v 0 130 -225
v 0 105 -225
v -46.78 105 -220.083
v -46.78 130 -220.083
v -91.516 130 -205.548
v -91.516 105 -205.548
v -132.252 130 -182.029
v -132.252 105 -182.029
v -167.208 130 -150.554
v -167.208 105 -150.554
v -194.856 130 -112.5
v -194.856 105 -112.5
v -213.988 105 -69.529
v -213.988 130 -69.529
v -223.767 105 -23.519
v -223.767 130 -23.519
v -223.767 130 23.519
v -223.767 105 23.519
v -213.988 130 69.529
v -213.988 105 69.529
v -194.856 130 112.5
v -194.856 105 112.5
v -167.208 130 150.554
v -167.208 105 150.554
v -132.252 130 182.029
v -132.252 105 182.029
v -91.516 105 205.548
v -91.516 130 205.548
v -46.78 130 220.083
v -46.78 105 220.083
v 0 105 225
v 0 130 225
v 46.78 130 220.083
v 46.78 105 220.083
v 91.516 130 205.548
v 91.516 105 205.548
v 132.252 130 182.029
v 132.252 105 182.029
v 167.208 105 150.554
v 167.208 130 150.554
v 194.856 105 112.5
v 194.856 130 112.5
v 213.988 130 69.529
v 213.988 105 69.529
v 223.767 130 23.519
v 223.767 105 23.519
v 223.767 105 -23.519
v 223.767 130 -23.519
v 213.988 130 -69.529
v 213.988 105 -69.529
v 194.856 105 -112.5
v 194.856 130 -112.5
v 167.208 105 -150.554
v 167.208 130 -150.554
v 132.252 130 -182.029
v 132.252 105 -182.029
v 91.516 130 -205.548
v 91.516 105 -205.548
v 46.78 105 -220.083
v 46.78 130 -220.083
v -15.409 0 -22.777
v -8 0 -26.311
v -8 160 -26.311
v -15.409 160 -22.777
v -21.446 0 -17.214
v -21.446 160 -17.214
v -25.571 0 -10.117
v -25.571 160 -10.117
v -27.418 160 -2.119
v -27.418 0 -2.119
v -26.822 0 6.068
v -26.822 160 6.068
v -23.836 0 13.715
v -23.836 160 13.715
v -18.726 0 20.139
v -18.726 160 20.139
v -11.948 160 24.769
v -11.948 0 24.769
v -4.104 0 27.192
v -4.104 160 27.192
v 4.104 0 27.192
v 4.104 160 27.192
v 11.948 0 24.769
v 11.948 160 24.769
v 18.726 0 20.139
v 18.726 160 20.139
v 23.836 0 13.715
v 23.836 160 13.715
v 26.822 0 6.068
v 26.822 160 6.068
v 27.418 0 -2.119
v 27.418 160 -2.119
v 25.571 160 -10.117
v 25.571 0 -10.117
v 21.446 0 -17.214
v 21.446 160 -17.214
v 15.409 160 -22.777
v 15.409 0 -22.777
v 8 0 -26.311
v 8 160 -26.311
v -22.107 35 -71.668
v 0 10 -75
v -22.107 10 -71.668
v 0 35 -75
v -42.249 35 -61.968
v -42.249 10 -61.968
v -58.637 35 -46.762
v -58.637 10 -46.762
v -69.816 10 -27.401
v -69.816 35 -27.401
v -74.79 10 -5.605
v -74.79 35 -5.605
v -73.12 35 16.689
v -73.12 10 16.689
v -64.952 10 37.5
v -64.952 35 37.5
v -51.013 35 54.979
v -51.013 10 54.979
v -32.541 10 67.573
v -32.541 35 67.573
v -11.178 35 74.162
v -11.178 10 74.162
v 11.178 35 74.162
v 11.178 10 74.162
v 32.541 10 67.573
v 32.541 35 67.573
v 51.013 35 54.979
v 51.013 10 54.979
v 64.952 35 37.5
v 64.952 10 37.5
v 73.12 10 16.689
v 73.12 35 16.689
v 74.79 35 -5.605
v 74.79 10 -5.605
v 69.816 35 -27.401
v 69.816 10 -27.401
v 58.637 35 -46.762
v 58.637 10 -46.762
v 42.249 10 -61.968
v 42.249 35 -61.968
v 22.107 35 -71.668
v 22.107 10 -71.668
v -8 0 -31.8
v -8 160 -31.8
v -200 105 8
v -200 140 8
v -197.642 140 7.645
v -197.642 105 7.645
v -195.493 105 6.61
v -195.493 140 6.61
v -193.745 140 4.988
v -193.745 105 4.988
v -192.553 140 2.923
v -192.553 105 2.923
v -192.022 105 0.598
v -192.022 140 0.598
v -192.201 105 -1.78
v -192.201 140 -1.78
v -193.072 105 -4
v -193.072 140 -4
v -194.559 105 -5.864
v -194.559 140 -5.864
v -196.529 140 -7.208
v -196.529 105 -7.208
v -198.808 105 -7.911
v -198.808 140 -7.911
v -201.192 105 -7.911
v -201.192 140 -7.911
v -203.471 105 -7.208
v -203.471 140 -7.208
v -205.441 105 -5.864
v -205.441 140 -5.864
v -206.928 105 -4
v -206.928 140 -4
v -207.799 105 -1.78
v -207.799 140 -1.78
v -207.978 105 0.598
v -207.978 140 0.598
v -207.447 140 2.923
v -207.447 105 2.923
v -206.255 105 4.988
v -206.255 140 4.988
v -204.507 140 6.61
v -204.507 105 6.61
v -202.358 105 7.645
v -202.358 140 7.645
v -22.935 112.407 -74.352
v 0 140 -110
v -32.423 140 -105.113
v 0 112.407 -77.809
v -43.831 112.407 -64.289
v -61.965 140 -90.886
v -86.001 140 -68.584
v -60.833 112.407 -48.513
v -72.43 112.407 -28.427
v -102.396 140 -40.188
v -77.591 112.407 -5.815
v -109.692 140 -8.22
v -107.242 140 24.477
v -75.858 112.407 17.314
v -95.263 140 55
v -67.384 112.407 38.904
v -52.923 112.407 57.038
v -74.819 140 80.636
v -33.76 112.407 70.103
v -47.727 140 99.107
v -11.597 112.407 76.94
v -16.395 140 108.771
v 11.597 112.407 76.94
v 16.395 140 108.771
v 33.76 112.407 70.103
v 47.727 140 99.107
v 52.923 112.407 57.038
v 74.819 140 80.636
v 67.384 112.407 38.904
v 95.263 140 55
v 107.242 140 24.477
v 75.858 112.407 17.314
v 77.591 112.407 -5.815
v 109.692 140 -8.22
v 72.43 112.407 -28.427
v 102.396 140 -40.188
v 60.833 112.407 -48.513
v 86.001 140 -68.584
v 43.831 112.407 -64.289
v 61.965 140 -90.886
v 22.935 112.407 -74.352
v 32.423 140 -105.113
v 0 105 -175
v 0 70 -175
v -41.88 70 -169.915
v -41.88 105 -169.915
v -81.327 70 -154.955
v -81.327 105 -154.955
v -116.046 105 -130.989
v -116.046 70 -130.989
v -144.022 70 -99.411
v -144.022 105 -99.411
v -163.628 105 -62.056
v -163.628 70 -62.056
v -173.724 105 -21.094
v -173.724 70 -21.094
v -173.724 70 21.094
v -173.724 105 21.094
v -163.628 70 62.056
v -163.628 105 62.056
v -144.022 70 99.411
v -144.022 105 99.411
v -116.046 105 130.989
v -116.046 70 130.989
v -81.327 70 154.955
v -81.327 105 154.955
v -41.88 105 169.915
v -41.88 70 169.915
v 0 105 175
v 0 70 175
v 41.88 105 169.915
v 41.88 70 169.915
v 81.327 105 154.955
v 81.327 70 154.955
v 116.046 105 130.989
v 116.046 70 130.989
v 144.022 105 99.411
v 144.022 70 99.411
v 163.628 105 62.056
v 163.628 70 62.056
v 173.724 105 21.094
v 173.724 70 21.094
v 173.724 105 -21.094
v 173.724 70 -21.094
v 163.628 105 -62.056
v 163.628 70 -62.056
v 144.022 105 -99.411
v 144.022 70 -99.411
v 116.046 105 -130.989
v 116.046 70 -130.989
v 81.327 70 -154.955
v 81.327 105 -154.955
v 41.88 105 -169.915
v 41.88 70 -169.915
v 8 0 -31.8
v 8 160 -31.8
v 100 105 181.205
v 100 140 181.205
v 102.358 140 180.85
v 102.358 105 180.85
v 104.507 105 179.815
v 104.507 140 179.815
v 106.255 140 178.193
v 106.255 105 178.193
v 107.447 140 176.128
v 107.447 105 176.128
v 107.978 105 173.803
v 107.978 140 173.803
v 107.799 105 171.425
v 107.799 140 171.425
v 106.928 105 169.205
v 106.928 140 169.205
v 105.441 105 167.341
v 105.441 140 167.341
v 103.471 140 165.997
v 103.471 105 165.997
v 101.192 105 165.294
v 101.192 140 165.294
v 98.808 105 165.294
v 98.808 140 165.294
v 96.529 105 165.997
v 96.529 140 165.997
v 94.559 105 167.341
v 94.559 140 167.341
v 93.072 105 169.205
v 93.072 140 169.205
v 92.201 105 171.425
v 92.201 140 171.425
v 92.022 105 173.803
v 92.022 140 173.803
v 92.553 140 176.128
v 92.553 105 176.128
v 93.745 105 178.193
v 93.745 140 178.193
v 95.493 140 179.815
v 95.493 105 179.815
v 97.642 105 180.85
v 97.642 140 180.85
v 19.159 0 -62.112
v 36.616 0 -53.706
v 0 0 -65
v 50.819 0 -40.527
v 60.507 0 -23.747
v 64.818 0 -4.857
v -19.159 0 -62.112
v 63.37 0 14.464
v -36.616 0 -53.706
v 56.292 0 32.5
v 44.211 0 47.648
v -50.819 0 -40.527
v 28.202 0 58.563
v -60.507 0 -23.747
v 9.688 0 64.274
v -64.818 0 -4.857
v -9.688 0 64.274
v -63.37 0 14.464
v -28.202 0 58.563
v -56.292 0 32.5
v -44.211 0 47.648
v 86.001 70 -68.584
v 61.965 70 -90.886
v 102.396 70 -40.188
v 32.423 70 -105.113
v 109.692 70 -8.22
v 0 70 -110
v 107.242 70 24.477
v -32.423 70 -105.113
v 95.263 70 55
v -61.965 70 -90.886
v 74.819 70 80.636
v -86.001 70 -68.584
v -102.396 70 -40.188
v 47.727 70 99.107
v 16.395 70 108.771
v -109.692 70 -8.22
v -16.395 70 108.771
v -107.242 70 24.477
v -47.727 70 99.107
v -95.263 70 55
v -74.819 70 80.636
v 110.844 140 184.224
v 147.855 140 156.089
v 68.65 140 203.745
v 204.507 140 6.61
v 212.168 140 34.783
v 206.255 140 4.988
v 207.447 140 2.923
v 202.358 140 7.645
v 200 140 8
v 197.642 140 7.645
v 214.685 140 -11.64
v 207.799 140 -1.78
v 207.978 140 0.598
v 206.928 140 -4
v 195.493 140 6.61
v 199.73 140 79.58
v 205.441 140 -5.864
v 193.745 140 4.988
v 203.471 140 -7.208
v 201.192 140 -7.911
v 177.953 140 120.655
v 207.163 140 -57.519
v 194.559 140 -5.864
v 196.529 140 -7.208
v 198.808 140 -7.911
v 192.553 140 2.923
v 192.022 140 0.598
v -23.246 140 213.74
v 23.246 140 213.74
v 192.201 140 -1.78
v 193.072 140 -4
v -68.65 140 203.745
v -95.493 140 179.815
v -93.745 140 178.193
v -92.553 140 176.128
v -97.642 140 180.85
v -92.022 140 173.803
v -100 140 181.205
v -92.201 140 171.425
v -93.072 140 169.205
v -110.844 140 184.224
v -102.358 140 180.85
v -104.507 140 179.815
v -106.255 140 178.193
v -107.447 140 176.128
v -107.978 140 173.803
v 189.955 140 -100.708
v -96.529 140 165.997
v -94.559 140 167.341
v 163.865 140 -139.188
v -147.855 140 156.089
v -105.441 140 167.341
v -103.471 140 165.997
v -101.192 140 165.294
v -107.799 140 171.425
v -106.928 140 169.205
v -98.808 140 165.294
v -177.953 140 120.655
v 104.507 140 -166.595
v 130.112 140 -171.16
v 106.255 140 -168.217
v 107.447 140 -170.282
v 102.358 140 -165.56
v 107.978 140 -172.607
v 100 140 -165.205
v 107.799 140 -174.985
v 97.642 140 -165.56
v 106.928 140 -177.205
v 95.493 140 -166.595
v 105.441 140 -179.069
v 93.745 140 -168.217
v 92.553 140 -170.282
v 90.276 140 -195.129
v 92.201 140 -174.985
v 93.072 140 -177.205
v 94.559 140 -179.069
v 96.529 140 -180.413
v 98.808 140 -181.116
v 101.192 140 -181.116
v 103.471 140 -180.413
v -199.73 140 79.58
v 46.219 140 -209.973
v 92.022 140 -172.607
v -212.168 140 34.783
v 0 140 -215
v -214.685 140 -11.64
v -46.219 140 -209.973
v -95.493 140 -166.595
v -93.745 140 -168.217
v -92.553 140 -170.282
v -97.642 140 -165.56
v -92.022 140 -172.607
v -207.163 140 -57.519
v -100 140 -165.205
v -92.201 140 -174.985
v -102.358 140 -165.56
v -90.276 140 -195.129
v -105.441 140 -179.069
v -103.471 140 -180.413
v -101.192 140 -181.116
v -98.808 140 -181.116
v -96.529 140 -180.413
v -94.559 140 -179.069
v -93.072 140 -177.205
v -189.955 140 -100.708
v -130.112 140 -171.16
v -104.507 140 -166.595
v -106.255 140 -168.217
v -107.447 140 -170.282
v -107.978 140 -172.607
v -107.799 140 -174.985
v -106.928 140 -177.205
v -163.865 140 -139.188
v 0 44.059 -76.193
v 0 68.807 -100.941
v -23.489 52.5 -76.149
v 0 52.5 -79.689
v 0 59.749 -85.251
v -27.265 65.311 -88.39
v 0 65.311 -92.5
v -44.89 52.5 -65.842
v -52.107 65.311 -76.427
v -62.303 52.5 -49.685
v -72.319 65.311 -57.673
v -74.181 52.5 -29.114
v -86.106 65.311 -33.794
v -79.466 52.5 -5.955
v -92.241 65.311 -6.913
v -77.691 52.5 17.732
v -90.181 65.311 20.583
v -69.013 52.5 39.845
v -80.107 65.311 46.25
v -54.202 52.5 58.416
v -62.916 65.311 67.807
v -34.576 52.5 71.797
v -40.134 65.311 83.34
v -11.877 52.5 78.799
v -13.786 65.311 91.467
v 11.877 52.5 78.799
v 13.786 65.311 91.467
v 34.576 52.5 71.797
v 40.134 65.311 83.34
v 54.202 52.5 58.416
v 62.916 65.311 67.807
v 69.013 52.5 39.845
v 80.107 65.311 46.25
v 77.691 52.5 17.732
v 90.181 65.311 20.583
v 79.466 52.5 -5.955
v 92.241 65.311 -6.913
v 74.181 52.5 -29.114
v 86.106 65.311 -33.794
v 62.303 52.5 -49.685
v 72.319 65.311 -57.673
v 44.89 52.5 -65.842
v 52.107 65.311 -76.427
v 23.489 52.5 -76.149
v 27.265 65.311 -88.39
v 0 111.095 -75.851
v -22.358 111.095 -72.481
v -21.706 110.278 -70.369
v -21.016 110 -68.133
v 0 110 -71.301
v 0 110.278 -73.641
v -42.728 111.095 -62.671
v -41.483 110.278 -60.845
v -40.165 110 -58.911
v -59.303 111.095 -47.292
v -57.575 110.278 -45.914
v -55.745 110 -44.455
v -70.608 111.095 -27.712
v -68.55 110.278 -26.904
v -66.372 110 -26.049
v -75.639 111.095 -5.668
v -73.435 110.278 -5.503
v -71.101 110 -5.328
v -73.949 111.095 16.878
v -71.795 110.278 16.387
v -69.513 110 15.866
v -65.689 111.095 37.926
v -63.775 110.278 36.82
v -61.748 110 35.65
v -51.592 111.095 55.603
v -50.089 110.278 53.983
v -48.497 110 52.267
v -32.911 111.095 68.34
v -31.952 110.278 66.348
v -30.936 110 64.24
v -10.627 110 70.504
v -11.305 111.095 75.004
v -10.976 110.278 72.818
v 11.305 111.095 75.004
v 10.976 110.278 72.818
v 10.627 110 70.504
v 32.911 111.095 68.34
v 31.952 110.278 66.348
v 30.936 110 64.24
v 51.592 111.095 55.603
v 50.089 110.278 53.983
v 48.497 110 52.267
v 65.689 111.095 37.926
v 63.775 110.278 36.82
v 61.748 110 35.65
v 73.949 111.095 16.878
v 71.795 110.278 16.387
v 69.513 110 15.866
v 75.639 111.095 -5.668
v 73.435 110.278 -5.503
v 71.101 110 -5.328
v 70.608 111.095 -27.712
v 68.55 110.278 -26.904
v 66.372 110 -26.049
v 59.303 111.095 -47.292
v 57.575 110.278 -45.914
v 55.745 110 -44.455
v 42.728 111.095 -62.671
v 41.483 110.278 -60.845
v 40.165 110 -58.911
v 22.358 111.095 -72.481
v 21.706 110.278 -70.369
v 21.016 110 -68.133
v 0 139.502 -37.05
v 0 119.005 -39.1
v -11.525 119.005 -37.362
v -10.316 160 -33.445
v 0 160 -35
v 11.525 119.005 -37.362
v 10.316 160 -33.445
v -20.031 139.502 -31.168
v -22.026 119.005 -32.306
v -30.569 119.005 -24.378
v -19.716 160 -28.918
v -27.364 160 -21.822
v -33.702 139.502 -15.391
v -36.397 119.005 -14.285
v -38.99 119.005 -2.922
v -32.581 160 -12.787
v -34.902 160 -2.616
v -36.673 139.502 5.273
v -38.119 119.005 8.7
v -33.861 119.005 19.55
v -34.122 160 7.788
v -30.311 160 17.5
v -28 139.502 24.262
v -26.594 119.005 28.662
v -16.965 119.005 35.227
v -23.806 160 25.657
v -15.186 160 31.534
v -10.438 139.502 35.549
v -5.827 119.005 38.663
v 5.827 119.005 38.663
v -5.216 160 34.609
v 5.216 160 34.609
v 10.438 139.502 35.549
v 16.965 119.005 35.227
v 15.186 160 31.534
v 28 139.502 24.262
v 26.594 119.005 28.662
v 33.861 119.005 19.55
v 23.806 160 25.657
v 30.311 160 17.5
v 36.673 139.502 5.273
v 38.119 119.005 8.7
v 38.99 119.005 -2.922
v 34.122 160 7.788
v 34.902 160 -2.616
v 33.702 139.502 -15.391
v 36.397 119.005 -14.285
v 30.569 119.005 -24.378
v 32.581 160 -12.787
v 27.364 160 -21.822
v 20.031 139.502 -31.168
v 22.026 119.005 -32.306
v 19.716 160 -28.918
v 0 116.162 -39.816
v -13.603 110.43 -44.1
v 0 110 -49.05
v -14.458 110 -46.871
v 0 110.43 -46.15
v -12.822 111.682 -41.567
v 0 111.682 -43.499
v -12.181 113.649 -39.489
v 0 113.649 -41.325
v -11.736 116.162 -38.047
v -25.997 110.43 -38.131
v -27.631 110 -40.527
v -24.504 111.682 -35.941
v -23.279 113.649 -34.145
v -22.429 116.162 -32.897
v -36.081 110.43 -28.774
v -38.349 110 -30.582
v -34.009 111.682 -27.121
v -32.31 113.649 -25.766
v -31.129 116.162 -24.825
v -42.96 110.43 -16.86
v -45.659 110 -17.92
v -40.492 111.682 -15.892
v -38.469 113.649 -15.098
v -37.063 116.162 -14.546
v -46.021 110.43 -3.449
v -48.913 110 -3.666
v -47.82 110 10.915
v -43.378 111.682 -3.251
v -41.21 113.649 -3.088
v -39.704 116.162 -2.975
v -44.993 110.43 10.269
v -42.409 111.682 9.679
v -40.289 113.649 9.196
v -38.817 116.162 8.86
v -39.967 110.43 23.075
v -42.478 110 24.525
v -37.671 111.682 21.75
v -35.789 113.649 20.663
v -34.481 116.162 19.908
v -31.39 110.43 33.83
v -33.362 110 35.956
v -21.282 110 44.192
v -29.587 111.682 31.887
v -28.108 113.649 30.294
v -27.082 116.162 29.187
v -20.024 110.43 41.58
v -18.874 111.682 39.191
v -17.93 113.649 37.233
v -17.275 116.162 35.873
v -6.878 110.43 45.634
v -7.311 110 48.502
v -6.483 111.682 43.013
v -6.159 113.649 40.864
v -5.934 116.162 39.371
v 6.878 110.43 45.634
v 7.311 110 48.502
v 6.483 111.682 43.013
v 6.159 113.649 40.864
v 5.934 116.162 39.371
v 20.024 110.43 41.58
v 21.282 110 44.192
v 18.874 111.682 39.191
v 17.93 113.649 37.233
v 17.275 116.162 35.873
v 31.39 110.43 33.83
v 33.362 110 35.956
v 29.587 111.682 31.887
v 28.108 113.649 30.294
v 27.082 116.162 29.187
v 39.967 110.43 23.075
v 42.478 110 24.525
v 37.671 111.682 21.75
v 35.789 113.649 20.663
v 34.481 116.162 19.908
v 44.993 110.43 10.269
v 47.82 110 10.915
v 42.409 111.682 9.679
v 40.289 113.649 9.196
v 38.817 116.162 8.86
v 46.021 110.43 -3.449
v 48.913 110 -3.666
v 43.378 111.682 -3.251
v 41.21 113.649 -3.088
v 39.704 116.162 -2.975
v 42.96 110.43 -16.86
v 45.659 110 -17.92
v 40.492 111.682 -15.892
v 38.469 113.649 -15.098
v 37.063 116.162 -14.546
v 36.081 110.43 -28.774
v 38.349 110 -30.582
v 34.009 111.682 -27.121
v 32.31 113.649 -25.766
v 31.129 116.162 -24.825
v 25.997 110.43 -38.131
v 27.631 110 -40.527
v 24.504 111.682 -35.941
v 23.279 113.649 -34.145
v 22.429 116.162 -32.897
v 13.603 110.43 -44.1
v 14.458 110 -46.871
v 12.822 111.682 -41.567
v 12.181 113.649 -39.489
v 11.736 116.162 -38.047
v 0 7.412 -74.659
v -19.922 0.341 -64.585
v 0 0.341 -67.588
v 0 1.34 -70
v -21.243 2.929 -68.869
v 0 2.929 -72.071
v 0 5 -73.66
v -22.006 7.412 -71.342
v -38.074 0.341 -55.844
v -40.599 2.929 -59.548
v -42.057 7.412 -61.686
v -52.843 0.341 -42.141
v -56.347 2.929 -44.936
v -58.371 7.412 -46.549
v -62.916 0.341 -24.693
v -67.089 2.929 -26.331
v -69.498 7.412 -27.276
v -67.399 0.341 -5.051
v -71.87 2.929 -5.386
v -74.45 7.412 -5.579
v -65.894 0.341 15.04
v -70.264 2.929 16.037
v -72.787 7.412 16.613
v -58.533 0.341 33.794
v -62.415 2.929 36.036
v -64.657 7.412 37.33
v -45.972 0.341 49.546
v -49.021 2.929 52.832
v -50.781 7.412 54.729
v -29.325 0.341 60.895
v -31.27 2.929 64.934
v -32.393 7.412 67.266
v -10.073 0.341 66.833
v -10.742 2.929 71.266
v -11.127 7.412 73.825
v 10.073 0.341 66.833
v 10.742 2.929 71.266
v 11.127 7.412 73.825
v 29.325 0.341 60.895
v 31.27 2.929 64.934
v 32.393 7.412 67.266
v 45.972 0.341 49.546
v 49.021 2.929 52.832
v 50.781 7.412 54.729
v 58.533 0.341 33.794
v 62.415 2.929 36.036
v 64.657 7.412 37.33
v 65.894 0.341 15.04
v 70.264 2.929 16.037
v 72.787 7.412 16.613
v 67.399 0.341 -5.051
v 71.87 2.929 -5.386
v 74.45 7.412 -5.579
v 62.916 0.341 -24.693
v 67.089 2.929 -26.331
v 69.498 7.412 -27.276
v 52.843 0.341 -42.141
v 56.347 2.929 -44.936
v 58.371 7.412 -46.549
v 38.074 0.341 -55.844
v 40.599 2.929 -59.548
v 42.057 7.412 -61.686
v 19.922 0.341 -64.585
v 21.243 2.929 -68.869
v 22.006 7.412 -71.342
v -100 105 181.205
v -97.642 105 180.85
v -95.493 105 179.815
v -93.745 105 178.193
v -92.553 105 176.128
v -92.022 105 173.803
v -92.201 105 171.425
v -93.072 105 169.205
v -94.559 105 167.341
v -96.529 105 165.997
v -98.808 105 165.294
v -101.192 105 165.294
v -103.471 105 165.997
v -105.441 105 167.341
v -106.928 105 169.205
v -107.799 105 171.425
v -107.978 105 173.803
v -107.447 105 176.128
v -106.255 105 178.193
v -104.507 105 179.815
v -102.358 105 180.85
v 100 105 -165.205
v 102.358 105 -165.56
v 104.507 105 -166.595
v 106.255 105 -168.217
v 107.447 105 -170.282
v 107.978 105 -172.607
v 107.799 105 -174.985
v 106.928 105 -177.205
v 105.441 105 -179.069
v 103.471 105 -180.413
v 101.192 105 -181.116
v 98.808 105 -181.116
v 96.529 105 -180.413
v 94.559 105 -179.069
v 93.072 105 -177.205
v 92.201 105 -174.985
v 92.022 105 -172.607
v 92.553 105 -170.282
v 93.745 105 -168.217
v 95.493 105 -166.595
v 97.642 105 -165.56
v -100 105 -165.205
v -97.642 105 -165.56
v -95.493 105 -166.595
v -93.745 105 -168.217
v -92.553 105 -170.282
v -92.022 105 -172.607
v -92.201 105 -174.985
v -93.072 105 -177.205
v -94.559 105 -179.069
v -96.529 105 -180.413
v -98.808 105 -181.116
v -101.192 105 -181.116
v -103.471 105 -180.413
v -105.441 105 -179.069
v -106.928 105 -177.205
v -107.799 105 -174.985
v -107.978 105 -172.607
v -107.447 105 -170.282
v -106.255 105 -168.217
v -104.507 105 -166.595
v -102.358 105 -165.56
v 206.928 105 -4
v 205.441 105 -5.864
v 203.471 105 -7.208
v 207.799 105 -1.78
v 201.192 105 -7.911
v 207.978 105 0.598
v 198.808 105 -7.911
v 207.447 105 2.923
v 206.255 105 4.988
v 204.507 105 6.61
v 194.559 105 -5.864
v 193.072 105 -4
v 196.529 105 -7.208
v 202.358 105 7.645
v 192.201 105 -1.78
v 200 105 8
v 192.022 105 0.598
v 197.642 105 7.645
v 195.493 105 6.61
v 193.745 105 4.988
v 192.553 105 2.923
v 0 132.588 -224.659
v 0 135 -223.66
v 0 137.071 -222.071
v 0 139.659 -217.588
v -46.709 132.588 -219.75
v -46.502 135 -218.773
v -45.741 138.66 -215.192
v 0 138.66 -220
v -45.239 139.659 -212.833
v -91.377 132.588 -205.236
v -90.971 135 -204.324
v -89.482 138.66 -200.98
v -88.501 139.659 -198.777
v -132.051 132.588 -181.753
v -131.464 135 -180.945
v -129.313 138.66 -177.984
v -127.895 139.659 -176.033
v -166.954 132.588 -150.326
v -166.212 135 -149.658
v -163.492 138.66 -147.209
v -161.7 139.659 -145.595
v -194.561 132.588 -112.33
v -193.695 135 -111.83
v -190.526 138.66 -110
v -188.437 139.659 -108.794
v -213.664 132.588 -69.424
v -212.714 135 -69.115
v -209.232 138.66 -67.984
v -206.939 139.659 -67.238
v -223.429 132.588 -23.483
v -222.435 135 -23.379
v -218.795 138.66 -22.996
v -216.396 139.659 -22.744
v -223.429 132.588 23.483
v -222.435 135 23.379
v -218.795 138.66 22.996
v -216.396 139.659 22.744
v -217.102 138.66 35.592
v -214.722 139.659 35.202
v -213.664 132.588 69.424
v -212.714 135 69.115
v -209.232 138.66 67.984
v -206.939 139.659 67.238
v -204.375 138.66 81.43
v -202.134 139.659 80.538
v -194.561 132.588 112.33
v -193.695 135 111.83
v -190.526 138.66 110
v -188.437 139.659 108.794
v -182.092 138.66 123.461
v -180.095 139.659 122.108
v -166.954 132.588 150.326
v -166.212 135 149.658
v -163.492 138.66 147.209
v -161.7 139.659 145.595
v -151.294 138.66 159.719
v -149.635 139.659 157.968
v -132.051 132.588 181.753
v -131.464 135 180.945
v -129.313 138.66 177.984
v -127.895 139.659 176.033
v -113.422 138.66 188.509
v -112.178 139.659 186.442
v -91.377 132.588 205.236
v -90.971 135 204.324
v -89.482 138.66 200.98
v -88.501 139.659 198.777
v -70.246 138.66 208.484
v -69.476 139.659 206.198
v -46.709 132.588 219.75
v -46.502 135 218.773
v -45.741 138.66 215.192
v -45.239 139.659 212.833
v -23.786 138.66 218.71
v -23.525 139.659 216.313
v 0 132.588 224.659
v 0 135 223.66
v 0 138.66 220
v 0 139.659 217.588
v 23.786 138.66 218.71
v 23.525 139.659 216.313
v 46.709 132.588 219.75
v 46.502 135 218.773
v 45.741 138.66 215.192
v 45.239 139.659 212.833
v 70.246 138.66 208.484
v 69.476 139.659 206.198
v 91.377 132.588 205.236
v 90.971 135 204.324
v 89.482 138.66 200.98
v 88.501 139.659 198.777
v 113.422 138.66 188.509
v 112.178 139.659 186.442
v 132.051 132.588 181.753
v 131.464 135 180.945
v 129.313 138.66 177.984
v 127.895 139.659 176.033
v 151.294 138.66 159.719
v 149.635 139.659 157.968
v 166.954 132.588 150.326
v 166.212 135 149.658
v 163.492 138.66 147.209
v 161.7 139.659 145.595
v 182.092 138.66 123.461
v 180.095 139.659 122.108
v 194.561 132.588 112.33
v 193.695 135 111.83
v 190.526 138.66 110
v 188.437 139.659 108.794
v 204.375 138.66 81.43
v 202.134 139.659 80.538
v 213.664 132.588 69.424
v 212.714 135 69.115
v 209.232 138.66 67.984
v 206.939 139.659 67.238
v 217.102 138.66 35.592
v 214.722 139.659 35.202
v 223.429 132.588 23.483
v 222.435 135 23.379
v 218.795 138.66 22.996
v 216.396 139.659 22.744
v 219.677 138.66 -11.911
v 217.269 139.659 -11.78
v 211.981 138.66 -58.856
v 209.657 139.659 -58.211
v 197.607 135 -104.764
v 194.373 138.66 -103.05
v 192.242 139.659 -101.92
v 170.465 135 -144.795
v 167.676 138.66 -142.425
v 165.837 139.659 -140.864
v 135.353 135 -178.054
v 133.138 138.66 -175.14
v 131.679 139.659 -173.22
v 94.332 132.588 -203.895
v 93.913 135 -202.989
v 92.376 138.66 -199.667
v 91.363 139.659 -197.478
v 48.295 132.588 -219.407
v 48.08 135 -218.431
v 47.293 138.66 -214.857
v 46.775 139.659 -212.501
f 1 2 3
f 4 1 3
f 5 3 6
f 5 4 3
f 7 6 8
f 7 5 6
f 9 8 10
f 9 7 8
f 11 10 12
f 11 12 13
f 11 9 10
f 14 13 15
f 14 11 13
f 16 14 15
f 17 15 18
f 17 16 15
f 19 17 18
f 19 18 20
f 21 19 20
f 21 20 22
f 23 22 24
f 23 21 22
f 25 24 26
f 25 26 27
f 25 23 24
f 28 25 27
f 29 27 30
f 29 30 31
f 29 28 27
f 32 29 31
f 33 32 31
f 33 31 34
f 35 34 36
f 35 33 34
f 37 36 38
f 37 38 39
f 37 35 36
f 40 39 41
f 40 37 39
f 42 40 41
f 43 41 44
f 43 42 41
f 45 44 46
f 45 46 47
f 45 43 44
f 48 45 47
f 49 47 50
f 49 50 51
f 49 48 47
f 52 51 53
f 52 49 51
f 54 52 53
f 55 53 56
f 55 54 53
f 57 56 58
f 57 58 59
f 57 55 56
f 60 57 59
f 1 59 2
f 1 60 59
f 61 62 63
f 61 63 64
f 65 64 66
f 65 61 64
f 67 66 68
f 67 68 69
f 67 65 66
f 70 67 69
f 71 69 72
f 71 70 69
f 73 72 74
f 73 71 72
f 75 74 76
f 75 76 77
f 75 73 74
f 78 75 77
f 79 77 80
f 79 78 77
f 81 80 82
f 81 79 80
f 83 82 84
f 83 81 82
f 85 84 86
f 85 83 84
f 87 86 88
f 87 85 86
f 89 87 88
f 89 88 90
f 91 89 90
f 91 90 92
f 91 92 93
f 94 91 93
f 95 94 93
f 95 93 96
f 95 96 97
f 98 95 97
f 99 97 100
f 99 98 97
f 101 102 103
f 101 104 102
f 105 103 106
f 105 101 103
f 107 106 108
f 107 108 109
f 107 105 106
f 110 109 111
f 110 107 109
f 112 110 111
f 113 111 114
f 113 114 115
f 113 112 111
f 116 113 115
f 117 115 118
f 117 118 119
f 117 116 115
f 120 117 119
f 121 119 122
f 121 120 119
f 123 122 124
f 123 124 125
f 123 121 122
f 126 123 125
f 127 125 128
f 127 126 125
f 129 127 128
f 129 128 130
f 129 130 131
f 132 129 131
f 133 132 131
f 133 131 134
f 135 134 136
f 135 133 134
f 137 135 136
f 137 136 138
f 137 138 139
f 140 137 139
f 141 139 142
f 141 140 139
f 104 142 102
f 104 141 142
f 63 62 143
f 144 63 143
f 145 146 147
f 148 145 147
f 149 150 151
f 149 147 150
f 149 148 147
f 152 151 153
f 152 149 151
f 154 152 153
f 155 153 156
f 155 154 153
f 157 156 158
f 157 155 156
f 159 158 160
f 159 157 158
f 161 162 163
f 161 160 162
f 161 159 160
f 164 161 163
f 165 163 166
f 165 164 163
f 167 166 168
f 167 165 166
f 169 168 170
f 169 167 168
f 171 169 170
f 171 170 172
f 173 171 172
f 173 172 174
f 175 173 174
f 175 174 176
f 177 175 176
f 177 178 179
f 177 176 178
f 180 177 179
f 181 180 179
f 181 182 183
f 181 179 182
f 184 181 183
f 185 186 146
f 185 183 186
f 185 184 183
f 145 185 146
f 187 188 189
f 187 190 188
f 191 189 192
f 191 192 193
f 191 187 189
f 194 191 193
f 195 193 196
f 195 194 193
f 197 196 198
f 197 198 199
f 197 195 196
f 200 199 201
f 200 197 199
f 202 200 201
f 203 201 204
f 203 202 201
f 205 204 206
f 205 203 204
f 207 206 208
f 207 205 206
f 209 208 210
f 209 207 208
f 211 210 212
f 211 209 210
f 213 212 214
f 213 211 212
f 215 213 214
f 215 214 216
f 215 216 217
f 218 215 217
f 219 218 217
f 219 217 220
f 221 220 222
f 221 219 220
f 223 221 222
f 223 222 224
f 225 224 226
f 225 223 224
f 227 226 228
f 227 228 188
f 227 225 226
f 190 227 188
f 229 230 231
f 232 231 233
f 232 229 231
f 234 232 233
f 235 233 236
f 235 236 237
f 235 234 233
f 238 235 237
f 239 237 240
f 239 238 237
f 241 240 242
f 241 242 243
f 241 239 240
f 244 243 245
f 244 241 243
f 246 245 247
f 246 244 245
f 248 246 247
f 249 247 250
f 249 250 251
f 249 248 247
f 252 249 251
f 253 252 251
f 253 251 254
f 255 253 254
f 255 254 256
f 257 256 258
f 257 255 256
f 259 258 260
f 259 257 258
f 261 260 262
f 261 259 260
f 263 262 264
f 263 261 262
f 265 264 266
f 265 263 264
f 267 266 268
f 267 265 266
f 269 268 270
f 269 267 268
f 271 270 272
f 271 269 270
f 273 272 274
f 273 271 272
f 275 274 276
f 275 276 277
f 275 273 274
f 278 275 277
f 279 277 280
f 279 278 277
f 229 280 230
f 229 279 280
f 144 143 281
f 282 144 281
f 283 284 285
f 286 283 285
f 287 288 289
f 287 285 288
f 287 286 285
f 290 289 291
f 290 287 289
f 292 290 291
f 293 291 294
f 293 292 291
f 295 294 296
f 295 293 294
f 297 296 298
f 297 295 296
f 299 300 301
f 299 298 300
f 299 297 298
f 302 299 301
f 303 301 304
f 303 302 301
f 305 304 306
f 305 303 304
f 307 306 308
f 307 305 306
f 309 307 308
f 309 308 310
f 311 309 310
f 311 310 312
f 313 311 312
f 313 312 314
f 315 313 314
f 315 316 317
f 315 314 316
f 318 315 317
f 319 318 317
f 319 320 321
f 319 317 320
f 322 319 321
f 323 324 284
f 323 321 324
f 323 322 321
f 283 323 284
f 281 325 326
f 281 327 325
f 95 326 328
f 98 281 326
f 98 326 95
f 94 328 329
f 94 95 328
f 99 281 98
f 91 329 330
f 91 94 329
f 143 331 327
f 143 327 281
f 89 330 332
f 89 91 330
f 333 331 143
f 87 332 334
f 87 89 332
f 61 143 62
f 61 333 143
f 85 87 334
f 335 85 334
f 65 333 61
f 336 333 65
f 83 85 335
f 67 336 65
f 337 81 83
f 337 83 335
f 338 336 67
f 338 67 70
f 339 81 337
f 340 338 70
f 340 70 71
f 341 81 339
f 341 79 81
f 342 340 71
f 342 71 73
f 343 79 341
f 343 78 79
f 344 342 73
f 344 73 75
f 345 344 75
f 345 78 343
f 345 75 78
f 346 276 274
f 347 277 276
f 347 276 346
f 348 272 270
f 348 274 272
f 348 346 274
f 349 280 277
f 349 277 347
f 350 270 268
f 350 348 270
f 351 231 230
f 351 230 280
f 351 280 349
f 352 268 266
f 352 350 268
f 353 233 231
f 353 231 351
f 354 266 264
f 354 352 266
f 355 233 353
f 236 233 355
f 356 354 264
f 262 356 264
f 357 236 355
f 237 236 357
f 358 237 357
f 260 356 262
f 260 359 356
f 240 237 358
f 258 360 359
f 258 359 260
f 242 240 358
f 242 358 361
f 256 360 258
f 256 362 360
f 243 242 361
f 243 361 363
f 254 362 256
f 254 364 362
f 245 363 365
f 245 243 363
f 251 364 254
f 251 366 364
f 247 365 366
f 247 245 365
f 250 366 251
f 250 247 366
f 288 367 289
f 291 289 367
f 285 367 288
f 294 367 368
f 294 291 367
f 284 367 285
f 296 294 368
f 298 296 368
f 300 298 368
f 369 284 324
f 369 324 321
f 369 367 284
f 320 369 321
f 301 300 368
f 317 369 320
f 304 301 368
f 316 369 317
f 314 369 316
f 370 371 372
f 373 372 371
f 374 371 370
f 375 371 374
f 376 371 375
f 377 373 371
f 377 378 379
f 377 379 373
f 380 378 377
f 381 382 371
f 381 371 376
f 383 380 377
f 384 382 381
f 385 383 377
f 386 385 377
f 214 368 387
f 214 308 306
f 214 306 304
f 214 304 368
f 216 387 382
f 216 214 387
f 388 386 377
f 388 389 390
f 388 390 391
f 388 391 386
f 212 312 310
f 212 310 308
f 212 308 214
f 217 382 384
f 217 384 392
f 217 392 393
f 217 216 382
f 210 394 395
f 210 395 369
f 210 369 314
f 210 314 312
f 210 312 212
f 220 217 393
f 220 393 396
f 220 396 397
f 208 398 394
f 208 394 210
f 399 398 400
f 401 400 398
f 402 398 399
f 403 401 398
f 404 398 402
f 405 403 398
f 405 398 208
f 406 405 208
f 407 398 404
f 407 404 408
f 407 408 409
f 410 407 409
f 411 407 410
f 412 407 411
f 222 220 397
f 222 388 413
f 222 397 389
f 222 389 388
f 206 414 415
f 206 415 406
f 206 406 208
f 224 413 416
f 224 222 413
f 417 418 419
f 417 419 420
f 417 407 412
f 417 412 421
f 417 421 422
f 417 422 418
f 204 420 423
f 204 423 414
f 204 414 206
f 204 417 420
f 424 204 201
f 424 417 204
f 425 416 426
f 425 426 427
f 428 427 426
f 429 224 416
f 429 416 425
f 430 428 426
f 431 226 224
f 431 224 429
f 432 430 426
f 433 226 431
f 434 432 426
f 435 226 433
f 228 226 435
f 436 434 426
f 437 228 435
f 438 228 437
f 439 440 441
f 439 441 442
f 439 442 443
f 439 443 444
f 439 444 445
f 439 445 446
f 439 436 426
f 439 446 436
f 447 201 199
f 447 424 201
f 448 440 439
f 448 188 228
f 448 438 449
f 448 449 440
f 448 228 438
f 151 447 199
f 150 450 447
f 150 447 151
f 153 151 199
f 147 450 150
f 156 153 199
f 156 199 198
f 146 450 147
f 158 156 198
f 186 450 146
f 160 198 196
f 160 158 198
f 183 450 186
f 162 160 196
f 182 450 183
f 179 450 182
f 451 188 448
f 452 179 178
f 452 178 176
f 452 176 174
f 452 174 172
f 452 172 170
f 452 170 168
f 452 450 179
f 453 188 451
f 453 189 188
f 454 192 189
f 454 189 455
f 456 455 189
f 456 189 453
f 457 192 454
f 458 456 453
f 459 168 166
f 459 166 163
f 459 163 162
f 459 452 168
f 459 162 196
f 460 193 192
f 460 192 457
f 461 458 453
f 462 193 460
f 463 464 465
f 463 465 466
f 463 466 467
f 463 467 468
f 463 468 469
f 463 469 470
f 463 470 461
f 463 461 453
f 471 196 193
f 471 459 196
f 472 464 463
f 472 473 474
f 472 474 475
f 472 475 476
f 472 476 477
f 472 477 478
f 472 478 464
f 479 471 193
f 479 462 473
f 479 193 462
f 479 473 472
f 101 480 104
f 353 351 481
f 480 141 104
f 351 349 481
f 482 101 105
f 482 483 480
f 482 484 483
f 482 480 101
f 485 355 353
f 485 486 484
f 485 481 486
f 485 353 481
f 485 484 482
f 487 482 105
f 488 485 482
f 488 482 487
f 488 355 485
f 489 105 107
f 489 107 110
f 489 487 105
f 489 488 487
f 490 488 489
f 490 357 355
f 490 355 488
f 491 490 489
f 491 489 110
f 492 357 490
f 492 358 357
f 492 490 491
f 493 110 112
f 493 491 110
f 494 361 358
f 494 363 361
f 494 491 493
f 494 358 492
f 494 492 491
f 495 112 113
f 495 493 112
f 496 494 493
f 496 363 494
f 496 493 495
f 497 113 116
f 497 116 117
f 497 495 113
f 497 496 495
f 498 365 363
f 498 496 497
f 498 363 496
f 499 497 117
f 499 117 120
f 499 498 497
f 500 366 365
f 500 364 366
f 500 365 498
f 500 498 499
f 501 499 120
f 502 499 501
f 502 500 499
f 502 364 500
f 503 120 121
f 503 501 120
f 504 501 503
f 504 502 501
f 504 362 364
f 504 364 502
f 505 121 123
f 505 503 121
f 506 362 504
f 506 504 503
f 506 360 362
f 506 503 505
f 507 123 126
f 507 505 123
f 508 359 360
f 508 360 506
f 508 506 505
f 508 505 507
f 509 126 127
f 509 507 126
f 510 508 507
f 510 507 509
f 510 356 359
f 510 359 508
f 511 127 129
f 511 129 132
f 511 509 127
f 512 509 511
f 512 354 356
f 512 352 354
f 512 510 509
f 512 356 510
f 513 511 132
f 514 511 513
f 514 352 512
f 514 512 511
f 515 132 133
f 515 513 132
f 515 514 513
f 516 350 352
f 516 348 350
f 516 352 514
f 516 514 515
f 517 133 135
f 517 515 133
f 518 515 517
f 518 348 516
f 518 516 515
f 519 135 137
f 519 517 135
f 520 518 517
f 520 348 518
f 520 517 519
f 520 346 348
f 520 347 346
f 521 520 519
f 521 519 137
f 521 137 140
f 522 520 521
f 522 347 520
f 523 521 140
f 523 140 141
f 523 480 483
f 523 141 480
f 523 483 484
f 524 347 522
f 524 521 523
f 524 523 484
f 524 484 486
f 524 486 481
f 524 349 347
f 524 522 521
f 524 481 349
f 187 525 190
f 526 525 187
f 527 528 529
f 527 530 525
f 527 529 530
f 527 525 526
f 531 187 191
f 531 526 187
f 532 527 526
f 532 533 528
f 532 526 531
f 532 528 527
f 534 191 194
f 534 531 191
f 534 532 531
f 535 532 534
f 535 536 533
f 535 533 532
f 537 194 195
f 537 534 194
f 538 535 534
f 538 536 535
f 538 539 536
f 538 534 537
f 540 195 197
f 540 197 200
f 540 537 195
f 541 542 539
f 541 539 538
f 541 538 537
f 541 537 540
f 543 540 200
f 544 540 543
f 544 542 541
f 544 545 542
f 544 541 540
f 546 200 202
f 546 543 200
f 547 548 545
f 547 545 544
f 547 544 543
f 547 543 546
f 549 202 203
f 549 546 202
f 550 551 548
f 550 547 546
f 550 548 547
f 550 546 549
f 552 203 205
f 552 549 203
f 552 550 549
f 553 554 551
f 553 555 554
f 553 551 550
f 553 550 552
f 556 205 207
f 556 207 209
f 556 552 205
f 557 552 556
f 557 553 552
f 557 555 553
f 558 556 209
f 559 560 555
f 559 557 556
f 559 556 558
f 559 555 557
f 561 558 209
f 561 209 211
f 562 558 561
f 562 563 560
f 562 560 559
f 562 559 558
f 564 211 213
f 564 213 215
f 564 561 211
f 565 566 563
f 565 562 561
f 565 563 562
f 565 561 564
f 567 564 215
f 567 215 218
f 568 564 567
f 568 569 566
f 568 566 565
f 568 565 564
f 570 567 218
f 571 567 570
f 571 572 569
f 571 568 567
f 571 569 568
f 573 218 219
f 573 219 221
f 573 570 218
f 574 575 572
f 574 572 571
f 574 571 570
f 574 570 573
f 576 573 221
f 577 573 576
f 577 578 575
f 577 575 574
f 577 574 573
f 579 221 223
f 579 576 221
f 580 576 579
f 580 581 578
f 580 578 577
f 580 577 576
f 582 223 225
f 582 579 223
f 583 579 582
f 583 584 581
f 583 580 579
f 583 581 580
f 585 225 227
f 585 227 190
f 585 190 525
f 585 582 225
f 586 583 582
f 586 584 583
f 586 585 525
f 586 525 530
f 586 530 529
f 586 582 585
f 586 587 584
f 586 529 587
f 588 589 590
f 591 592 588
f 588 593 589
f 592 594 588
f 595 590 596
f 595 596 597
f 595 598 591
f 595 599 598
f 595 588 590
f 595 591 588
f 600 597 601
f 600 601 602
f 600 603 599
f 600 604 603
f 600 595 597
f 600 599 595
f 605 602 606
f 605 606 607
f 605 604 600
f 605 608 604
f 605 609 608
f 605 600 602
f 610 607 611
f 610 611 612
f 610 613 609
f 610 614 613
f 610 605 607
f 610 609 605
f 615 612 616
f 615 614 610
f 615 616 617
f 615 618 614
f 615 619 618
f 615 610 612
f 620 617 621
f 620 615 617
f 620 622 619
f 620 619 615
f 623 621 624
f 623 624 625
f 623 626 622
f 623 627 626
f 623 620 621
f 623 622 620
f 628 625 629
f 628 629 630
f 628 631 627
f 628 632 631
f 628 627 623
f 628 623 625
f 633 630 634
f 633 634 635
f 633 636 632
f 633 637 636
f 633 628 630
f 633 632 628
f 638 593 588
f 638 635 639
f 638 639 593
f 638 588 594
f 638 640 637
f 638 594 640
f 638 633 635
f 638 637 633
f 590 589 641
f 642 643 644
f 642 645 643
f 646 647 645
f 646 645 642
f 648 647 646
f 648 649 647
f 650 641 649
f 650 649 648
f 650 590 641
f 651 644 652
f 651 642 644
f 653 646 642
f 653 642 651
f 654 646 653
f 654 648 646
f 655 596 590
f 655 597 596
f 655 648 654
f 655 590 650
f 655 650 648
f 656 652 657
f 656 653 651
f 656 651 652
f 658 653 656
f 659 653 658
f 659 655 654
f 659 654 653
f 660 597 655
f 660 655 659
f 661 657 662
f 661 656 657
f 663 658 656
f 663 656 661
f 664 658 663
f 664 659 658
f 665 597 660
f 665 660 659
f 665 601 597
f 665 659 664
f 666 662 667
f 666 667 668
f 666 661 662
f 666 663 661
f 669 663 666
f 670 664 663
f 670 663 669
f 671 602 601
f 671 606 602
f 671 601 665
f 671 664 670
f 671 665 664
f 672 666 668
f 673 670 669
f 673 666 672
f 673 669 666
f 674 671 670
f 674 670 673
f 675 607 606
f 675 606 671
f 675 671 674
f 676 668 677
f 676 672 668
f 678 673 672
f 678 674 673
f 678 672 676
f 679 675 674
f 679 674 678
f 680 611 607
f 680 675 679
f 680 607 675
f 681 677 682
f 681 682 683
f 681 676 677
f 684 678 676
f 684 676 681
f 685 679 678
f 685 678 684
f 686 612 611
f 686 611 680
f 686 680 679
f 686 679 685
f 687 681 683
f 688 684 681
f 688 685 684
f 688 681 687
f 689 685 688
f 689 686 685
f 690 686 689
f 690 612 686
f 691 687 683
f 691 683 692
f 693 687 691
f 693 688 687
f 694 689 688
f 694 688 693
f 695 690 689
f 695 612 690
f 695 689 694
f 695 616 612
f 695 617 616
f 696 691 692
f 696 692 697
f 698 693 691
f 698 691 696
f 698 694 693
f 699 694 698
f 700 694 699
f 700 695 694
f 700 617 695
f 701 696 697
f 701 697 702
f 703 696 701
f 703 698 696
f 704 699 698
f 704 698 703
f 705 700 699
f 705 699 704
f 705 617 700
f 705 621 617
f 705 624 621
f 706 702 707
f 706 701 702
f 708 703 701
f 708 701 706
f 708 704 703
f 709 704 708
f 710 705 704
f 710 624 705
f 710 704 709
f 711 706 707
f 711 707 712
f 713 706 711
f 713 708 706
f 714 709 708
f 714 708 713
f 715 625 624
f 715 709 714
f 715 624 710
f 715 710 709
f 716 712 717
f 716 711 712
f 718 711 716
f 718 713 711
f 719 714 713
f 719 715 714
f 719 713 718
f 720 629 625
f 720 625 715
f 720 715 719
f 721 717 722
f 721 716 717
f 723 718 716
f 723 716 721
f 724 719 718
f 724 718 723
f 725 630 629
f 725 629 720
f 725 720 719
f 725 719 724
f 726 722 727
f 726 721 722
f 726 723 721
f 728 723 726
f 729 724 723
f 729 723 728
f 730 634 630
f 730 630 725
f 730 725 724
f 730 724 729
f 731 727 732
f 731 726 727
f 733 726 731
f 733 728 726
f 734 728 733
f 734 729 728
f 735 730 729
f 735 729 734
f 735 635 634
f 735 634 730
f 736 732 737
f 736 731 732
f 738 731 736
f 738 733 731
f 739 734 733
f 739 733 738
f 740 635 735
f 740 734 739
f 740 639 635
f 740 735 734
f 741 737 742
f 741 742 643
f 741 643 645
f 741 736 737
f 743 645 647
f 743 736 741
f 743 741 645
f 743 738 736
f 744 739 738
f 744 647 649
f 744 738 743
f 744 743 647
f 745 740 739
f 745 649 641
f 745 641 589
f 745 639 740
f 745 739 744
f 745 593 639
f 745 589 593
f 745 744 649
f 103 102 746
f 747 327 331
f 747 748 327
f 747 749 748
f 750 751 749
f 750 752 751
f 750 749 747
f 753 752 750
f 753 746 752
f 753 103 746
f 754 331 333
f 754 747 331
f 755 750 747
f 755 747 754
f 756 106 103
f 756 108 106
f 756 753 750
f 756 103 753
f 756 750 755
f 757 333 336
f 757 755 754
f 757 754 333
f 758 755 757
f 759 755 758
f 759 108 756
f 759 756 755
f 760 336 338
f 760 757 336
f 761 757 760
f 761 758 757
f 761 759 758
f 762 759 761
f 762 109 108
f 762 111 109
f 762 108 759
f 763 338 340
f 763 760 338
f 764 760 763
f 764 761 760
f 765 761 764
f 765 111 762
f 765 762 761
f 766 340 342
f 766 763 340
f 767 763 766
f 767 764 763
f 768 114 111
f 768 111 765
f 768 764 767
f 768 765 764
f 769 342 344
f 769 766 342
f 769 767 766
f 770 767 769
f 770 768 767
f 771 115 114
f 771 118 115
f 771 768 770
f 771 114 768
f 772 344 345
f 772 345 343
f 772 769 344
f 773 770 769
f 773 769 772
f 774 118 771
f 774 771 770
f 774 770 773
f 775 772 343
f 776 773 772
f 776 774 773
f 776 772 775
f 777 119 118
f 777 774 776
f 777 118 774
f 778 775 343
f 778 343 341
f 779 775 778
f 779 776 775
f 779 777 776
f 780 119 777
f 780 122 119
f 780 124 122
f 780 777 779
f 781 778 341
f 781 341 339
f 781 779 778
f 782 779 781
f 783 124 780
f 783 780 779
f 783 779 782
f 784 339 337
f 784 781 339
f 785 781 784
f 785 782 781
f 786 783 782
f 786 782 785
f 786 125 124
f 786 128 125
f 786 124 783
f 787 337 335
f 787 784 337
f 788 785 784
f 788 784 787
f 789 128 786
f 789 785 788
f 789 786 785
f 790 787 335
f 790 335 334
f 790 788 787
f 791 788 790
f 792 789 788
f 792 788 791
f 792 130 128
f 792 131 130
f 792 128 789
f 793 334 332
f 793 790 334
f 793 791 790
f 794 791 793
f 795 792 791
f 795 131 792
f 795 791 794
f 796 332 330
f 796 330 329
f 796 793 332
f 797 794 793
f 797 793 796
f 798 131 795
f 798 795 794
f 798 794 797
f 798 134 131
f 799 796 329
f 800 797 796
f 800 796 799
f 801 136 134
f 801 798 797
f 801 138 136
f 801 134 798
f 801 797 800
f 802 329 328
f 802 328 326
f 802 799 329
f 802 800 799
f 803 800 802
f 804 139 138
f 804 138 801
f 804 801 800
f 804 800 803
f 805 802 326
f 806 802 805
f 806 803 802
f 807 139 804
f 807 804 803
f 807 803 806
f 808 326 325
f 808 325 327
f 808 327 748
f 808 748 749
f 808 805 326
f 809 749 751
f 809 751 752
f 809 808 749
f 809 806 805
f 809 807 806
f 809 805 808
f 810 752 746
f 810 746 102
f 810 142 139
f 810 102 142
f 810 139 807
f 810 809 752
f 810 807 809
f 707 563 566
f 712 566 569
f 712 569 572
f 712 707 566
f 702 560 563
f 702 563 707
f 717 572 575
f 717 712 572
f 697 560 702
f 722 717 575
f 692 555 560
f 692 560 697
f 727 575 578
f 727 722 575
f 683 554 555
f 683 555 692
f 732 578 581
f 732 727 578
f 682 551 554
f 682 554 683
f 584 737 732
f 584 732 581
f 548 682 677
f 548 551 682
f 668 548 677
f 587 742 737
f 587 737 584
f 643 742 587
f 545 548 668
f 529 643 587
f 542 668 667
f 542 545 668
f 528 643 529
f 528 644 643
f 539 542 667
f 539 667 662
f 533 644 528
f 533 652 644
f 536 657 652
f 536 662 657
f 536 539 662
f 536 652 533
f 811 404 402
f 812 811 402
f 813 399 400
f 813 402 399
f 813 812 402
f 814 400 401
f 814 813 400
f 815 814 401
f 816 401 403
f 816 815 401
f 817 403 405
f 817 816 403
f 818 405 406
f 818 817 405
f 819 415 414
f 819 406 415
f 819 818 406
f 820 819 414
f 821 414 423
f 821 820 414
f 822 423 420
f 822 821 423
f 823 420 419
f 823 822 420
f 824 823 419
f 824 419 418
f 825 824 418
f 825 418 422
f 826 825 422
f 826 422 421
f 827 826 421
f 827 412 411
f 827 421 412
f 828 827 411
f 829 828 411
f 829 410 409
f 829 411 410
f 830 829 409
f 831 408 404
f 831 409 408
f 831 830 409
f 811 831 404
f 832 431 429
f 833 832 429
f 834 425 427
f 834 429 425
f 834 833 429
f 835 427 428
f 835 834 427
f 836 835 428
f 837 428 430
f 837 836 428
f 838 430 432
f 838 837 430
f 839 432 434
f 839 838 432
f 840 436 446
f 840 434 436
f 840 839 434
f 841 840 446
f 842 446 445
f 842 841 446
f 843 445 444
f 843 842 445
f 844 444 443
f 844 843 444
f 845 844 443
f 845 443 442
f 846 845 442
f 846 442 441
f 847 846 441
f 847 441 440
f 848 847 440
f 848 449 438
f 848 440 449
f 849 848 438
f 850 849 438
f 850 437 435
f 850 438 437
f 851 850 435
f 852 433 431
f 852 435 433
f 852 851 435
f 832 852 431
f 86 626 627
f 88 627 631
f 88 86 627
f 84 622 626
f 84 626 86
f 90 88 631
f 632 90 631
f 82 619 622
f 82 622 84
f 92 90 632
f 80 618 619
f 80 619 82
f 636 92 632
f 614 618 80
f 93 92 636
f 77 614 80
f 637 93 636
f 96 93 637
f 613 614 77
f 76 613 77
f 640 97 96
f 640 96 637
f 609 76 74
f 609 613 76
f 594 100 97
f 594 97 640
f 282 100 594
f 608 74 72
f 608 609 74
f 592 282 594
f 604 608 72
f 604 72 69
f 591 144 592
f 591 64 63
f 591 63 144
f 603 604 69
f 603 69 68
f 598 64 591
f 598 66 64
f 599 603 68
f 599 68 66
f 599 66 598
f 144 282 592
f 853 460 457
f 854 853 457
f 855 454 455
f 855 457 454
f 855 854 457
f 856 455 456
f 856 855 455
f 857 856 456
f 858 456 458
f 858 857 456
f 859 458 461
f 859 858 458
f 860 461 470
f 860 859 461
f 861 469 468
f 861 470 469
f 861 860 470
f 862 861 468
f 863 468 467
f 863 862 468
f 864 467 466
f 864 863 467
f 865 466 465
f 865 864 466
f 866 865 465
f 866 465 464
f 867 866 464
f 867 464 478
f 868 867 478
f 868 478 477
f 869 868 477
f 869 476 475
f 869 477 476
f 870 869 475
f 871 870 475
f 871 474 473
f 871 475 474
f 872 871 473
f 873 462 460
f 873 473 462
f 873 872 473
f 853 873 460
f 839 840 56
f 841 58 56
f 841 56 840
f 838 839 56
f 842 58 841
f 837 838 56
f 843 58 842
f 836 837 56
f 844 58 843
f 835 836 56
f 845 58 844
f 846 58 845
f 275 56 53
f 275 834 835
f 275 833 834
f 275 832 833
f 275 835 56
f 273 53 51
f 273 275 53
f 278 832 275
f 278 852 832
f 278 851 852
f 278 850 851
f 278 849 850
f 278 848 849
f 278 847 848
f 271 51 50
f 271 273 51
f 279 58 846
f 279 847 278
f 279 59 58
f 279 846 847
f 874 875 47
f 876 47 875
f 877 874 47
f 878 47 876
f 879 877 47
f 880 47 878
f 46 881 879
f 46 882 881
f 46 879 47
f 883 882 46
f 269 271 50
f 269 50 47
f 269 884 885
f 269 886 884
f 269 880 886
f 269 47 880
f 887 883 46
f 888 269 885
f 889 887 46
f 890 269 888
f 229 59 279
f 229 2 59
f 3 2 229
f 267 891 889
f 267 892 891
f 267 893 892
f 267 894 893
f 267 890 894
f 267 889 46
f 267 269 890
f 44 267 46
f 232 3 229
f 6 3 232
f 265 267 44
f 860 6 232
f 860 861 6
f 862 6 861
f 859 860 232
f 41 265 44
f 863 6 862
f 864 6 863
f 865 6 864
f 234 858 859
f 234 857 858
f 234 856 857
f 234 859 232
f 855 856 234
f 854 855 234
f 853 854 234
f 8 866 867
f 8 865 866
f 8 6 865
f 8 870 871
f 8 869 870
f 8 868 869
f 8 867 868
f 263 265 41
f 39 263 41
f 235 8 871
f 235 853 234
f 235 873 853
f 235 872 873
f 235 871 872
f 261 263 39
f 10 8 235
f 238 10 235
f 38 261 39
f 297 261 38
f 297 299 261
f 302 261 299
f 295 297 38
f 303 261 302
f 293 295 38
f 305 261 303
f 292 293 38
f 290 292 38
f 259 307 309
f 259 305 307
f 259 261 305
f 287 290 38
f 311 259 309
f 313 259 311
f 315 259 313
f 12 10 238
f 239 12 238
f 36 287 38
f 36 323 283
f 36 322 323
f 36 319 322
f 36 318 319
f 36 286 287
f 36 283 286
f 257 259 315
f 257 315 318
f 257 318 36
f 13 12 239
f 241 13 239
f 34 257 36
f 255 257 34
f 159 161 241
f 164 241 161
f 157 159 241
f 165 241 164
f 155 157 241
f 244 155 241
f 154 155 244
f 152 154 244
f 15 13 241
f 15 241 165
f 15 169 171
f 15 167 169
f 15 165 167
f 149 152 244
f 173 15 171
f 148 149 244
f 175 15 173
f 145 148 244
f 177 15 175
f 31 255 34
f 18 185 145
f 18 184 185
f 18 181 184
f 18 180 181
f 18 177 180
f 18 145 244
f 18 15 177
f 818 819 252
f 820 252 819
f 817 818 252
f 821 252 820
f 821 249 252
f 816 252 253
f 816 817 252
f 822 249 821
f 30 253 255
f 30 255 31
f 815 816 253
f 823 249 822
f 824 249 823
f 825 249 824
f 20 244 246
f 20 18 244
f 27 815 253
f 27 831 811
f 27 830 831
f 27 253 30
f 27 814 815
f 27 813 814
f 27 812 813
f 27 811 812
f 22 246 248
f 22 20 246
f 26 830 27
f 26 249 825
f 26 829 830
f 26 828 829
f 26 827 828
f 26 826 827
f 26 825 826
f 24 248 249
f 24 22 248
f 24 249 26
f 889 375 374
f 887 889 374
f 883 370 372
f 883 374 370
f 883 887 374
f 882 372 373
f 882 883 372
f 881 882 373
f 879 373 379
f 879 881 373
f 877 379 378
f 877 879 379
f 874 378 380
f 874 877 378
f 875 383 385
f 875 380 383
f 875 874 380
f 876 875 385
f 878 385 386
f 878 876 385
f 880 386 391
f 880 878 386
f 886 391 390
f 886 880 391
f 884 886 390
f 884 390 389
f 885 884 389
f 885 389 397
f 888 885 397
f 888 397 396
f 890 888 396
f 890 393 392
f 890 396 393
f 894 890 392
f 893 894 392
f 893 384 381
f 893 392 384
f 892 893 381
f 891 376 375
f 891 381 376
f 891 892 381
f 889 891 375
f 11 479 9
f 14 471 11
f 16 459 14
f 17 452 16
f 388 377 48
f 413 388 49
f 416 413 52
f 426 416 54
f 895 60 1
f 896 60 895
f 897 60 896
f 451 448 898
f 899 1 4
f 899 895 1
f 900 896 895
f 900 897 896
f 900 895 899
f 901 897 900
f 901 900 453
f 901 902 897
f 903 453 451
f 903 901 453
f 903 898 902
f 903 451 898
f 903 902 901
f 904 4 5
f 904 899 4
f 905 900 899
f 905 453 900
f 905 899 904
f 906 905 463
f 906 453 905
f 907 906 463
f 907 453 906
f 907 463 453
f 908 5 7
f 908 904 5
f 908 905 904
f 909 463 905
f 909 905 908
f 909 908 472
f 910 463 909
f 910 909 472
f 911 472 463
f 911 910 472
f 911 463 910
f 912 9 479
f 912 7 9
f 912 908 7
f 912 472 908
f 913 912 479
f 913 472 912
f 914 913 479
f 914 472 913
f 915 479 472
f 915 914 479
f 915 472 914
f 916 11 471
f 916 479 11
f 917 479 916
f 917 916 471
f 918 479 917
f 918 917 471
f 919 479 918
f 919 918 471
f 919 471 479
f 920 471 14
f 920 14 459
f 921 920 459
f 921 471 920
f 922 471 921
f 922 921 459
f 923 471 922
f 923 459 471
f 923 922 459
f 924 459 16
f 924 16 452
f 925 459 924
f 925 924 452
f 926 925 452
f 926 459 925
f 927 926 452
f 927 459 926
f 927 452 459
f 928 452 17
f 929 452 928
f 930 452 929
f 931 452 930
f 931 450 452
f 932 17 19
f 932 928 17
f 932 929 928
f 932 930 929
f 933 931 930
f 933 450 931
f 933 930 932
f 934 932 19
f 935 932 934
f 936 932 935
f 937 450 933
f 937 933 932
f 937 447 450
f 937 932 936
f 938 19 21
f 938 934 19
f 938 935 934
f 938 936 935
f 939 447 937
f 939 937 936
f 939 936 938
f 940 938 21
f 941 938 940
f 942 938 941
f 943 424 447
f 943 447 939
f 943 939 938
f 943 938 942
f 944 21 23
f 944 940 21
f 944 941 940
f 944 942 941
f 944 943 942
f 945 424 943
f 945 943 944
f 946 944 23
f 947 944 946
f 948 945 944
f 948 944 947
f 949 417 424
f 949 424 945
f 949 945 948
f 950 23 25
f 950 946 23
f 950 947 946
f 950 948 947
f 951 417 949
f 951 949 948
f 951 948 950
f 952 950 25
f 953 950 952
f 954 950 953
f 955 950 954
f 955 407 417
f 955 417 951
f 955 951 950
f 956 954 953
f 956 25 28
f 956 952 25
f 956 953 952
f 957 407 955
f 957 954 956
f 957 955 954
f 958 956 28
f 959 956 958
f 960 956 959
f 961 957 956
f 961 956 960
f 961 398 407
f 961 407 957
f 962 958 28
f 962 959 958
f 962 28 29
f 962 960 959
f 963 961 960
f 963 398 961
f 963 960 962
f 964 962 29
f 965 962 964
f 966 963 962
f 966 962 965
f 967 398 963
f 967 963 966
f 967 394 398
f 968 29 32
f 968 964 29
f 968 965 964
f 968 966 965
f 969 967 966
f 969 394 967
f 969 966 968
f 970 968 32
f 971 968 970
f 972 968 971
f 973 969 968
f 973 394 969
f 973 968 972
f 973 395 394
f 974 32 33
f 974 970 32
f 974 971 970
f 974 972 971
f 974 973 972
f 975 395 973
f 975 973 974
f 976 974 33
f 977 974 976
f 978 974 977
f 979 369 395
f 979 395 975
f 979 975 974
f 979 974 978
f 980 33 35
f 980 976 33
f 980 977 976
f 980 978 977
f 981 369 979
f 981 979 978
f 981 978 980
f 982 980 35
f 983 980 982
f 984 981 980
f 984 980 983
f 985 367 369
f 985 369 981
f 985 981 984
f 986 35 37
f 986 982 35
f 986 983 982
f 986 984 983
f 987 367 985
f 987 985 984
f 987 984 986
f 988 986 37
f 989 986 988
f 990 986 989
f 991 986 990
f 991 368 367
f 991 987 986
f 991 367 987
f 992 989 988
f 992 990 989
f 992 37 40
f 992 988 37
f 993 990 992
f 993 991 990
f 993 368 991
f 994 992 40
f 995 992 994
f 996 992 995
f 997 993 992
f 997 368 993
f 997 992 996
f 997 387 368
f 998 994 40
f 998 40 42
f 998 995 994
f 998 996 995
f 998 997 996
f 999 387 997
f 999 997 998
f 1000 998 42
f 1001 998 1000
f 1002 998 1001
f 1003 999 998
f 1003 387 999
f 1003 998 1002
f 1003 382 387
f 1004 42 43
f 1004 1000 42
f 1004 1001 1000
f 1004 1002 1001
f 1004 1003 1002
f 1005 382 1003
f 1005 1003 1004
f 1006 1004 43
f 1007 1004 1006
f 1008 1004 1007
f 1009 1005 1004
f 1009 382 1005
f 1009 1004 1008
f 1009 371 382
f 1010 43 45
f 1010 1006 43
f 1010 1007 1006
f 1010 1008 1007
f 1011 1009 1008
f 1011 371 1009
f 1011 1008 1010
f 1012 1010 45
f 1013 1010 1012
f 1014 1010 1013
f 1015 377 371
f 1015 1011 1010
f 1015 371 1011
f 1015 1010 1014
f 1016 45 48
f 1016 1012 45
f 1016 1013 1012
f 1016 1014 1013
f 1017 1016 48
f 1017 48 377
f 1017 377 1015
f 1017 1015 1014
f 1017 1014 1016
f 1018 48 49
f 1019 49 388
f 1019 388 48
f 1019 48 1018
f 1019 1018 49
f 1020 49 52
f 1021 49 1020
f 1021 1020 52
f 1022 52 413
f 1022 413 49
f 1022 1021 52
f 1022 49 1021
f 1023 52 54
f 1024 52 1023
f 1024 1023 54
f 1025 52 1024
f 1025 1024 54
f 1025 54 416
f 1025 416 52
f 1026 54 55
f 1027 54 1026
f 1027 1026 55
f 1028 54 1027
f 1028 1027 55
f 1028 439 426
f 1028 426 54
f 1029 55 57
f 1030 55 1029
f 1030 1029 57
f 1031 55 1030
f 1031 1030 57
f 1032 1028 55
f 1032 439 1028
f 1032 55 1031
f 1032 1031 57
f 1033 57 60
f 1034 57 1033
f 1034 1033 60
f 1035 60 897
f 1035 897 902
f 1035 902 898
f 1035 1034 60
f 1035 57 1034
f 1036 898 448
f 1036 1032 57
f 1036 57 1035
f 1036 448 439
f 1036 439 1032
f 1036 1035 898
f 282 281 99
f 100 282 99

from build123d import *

# Parameters (mm, degrees)
CUT_EXTRUDE1_DEPTH      = 348.634865915
CUT_EXTRUDE1_DEPTH_BACK = 348.634865915
SKETCH2_R               = 8
CUT_EXTRUDE2_DEPTH      = 357.16007637
CUT_EXTRUDE2_DEPTH_BACK = 357.16007637


with BuildPart() as part:
    # Sketch1 → Revolve1 (revolve)
    with BuildSketch(Plane.XY, mode=Mode.PRIVATE) as revolve1_sk:
        with BuildLine():
            Line((27.5, 0), (65, 0))
            ThreePointArc((65, 0), (72.071067812, 2.928932188), (75, 10))
            Line((75, 10), (75, 35))
            ThreePointArc((75, 35), (85.251262658, 59.748737342), (110, 70))
            Line((110, 70), (175, 70))
            Line((175, 70), (175, 105))
            Line((175, 105), (225, 105))
            Line((225, 105), (225, 130))
            ThreePointArc((225, 130), (222.071067812, 137.071067812), (215, 140))
            Line((215, 140), (110, 140))
            Line((110, 140), (77.808672972, 112.407433976))
            ThreePointArc((77.808672972, 112.407433976), (74.770221715, 110.621149851), (71.300759238, 110))
            Line((71.300759238, 110), (49.049875621, 110))
            ThreePointArc((49.049875621, 110), (42.339822414, 112.585474664), (39.099503719, 119.00496281))
            Line((39.099503719, 119.00496281), (35, 160))
            Line((35, 160), (27.5, 160))
            Line((27.5, 160), (27.5, 0))
        make_face()
    revolve(revolve1_sk.sketch.rotate(Axis((0, 0, 0), (0, 1, 0)), 90), axis=Axis((0, 0, 0), (0, 1, 0)))

    # Sketch2 → Cut-Extrude1 (cut, two sides: drawn at the far end of the back side and taken through both)
    with BuildSketch(Plane(origin=(0, 140, 0), x_dir=(1, 0, 0), z_dir=(0, 1, 0)).offset(-CUT_EXTRUDE1_DEPTH_BACK)):
        with Locations(Location((200, 0, 0), (0, 0, 270))):
            Circle(SKETCH2_R)
        with Locations(Location((100, -173.205080757, 0), (0, 0, 270))):
            Circle(SKETCH2_R)
        with Locations(Location((-100, -173.205080757, 0), (0, 0, 270))):
            Circle(SKETCH2_R)
        with Locations(Location((-200, 0, 0), (0, 0, 270))):
            Circle(SKETCH2_R)
        with Locations(Location((-100, 173.205080757, 0), (0, 0, 270))):
            Circle(SKETCH2_R)
        with Locations(Location((100, 173.205080757, 0), (0, 0, 270))):
            Circle(SKETCH2_R)
    extrude(amount=CUT_EXTRUDE1_DEPTH + CUT_EXTRUDE1_DEPTH_BACK, mode=Mode.SUBTRACT)

    # Sketch3 → Cut-Extrude2 (cut, two sides: drawn at the far end of the back side and taken through both)
    with BuildSketch(Plane(origin=(0, 160, 0), x_dir=(1, 0, 0), z_dir=(0, 1, 0)).offset(-CUT_EXTRUDE2_DEPTH_BACK)):
        with BuildLine():
            Line((-8, 26.310644234), (-8, 31.8))
            Line((-8, 31.8), (8, 31.8))
            Line((8, 31.8), (8, 26.310644234))
            ThreePointArc((8, 26.310644234), (0, 27.5), (-8, 26.310644234))
        make_face()
    extrude(amount=CUT_EXTRUDE2_DEPTH + CUT_EXTRUDE2_DEPTH_BACK, mode=Mode.SUBTRACT)


solid = part.part
